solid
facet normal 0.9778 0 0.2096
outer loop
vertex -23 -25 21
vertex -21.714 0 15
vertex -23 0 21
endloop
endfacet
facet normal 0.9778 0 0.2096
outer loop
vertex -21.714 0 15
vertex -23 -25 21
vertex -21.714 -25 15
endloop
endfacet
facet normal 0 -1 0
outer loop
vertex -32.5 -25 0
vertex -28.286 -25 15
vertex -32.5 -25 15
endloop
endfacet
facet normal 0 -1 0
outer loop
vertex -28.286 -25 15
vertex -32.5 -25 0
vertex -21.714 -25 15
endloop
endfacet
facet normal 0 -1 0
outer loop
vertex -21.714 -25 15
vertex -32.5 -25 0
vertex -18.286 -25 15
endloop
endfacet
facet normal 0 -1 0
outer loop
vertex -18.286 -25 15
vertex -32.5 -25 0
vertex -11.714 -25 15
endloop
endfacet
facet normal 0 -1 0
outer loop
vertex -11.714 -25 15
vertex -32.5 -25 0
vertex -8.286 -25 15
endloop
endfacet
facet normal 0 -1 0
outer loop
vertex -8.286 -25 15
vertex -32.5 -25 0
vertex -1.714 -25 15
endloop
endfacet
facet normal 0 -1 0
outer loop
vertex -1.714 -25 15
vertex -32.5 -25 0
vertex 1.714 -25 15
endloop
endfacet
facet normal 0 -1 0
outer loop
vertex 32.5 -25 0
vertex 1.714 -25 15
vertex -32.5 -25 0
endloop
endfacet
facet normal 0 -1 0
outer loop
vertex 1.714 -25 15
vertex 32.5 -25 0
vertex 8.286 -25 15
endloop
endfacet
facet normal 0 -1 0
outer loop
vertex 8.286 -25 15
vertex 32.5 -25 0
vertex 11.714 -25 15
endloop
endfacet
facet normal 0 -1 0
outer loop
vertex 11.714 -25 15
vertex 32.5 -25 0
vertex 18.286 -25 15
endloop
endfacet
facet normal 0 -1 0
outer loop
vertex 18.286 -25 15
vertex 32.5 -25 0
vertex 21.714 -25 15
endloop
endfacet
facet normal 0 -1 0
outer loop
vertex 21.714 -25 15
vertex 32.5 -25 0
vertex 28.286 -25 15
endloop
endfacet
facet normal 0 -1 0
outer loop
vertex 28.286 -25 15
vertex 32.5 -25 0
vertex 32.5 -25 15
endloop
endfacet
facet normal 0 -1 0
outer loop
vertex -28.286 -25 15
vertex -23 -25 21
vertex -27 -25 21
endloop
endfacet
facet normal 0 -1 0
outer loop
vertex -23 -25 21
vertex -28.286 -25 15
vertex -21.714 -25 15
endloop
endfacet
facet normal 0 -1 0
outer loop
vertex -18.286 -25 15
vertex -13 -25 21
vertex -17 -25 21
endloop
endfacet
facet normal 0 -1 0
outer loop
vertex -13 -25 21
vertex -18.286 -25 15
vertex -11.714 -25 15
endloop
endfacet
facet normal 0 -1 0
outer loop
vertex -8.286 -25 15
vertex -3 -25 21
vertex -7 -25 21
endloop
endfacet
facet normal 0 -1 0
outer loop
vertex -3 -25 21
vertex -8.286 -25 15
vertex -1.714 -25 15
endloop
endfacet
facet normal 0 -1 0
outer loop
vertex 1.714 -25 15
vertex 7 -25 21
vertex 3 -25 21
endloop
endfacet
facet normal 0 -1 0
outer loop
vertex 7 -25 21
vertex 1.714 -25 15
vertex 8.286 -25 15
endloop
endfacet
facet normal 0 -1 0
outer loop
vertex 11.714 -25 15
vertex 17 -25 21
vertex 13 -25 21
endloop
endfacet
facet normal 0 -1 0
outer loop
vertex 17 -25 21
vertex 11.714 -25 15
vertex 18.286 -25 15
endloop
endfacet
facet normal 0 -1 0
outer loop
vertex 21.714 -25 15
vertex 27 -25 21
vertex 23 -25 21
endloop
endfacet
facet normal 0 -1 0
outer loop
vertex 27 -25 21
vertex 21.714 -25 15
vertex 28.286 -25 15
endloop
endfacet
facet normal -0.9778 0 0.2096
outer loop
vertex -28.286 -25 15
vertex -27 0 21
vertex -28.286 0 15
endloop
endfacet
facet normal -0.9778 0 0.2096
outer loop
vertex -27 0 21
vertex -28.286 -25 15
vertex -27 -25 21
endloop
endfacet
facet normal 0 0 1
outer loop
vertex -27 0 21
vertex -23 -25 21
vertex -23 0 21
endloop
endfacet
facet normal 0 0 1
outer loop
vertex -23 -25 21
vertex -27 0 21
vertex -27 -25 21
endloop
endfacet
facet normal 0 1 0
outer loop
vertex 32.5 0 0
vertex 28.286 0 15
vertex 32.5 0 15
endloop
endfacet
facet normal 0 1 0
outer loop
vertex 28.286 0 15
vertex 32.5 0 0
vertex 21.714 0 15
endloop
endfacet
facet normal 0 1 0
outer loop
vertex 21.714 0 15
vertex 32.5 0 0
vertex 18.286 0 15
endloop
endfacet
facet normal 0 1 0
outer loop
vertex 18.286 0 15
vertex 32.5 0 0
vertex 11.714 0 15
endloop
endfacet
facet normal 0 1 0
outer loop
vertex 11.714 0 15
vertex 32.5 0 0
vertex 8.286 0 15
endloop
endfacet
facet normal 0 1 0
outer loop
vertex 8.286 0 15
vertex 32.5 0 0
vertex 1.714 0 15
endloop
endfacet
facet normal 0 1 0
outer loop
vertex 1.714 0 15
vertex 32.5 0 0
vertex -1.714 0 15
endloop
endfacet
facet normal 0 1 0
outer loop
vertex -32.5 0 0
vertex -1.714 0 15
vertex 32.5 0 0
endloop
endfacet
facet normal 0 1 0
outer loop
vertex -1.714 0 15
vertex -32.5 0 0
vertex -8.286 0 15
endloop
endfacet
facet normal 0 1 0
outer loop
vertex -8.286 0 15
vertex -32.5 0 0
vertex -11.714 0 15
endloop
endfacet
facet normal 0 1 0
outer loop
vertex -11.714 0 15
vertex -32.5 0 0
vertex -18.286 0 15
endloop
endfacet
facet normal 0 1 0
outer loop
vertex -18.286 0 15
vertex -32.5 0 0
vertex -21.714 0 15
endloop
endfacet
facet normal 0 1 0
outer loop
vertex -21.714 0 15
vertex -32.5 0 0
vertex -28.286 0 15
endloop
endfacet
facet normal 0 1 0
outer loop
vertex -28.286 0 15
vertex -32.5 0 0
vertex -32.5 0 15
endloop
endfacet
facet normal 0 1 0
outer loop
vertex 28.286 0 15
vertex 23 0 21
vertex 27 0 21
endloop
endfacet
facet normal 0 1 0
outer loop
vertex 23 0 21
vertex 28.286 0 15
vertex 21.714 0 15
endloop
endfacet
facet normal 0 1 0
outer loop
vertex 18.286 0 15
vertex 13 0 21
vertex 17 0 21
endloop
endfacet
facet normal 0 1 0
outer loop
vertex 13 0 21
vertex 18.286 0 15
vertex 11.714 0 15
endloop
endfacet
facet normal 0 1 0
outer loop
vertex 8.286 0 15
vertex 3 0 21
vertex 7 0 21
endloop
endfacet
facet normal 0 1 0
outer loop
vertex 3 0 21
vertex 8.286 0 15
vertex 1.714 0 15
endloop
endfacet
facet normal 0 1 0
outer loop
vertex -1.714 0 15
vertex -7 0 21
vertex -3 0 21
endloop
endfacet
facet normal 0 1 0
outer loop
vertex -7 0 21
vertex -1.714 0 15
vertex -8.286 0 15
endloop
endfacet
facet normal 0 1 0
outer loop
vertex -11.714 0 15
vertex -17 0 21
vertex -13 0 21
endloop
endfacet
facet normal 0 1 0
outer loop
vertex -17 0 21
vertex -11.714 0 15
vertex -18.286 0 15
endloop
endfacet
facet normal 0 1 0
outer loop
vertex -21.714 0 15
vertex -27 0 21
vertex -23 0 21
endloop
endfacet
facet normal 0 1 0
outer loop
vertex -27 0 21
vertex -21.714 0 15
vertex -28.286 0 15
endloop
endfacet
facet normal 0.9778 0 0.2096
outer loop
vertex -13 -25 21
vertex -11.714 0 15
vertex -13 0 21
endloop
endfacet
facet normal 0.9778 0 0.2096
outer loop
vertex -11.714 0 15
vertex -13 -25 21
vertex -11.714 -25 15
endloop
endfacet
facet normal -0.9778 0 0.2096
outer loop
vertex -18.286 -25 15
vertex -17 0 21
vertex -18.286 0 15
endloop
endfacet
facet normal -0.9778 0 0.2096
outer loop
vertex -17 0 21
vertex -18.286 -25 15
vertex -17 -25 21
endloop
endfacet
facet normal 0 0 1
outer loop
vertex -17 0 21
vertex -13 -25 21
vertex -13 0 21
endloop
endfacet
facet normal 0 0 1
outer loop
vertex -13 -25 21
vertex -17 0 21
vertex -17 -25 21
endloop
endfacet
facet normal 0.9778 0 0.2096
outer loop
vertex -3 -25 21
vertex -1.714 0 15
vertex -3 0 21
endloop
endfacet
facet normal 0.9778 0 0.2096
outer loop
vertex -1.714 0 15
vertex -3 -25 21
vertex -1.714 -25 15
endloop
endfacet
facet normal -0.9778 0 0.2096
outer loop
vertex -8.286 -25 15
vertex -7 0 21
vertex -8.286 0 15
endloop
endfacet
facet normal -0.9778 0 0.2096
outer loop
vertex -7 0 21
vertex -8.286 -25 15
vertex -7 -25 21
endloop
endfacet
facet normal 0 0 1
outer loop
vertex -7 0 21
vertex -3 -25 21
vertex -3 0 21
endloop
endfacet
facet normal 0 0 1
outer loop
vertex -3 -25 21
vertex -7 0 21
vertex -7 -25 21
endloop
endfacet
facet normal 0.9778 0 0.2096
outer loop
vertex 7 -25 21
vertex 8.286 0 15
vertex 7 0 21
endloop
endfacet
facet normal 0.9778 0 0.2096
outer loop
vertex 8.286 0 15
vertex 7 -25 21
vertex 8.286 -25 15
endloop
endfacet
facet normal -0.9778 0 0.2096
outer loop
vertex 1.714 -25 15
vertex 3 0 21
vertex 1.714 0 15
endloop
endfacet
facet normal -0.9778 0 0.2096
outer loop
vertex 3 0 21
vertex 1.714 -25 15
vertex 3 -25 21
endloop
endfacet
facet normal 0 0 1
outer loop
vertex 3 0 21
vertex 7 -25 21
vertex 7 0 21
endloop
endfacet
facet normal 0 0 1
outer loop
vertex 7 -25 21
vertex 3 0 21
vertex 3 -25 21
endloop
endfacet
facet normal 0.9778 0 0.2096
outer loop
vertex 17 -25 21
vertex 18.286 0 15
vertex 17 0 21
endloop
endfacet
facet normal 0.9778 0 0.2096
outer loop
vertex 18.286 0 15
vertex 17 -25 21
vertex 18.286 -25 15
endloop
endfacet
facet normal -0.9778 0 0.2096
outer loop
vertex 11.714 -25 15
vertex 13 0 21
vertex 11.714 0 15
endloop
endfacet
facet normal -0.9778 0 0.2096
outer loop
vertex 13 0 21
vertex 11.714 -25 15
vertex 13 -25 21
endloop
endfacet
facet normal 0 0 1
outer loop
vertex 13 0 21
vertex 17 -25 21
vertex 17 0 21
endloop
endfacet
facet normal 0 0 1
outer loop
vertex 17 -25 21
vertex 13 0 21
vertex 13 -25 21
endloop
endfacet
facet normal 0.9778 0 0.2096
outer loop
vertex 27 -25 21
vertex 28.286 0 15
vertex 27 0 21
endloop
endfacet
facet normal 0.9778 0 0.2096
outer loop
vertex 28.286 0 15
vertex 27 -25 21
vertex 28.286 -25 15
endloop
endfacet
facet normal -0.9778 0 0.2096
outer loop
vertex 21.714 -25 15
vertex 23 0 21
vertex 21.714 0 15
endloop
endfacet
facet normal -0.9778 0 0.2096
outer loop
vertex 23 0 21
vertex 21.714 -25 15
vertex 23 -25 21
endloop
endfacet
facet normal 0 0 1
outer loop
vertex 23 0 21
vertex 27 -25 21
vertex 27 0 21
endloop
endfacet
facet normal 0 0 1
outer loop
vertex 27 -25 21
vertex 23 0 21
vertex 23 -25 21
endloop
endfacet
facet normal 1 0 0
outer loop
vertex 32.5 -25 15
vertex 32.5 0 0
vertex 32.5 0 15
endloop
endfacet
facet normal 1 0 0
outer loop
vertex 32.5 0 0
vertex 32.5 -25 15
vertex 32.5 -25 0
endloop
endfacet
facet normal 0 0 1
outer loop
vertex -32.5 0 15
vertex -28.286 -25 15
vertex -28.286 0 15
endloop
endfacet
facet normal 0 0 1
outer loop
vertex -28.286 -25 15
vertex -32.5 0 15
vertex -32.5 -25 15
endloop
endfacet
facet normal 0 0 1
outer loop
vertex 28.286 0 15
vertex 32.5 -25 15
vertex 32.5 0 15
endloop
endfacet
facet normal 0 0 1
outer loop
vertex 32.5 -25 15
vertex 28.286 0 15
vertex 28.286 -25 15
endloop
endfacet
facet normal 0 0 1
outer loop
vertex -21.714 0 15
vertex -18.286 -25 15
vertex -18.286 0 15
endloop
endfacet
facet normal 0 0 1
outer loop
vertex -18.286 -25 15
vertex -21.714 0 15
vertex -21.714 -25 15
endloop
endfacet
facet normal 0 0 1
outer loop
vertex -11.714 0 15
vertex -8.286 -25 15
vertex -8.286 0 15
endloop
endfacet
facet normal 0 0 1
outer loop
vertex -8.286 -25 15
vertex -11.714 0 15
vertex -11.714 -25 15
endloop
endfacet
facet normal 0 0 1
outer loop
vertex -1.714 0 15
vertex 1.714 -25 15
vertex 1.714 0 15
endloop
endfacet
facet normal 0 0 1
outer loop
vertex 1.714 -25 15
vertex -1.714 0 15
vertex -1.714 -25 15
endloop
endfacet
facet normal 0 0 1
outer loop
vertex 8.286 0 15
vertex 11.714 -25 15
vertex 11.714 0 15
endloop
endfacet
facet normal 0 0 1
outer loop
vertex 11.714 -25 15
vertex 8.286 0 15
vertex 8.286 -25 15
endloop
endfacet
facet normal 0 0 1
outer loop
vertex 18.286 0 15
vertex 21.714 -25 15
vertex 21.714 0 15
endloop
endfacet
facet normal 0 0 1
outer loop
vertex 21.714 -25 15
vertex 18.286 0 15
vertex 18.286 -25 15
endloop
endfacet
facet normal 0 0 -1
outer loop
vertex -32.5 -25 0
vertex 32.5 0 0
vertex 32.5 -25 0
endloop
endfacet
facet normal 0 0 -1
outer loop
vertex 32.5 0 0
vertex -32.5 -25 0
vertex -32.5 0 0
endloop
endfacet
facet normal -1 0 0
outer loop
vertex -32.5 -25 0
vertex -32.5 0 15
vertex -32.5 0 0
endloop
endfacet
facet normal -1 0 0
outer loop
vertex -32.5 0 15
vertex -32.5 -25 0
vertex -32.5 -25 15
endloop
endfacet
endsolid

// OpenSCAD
$fn = 32;

// ----------------------------------------------------------------------
// Toothed rack, 6 teeth
// 10 mm pitch, 6 mm teeth
// ----------------------------------------------------------------------

// --- parameters (mm) ---
bar_w = 25;   // bar width (Y)
bar_h = 15;   // bar height (Z)
teeth = 6;    // number of teeth
pitch = 10;   // tooth pitch
tooth_h = 6;  // tooth height above the bar
root_w = 7;   // tooth width at the root
crest_w = 4;  // tooth width at the crest

// --- derived feature positions (mm) ---
span = (teeth - 1) * pitch;  // = 50   distance between the outer teeth
bar_l = span + root_w + 8;   // = 65   bar length: teeth plus 4 mm at each end
tooth_x = -span / 2;         // = -25   X of the first tooth
height = bar_h + tooth_h;    // = 21   overall height
feature_centers = [
  [tooth_x + 0 * pitch, -bar_w / 2],
  [tooth_x + 1 * pitch, -bar_w / 2],
  [tooth_x + 2 * pitch, -bar_w / 2],
  [tooth_x + 3 * pitch, -bar_w / 2],
  [tooth_x + 4 * pitch, -bar_w / 2],
  [tooth_x + 5 * pitch, -bar_w / 2]
];   // tooth centre line, drives the tooth loop

// bar with a rack of teeth, one extruded trapezoium per centre
module rack_tooth() {
  linear_extrude(height = bar_w)
    polygon(points = [
      [0, 0],
      [root_w, 0],
      [root_w / 2 + crest_w / 2, tooth_h + 1],
      [root_w / 2 - crest_w / 2, tooth_h + 1]
    ]);
}

union() {
  translate([-bar_l / 2, -bar_w, 0]) cube([bar_l, bar_w, bar_h]);
  for (centre = feature_centers)
    translate([centre[0] - root_w / 2, 0, bar_h - 1]) rotate([90, 0, 0]) rack_tooth();
}
